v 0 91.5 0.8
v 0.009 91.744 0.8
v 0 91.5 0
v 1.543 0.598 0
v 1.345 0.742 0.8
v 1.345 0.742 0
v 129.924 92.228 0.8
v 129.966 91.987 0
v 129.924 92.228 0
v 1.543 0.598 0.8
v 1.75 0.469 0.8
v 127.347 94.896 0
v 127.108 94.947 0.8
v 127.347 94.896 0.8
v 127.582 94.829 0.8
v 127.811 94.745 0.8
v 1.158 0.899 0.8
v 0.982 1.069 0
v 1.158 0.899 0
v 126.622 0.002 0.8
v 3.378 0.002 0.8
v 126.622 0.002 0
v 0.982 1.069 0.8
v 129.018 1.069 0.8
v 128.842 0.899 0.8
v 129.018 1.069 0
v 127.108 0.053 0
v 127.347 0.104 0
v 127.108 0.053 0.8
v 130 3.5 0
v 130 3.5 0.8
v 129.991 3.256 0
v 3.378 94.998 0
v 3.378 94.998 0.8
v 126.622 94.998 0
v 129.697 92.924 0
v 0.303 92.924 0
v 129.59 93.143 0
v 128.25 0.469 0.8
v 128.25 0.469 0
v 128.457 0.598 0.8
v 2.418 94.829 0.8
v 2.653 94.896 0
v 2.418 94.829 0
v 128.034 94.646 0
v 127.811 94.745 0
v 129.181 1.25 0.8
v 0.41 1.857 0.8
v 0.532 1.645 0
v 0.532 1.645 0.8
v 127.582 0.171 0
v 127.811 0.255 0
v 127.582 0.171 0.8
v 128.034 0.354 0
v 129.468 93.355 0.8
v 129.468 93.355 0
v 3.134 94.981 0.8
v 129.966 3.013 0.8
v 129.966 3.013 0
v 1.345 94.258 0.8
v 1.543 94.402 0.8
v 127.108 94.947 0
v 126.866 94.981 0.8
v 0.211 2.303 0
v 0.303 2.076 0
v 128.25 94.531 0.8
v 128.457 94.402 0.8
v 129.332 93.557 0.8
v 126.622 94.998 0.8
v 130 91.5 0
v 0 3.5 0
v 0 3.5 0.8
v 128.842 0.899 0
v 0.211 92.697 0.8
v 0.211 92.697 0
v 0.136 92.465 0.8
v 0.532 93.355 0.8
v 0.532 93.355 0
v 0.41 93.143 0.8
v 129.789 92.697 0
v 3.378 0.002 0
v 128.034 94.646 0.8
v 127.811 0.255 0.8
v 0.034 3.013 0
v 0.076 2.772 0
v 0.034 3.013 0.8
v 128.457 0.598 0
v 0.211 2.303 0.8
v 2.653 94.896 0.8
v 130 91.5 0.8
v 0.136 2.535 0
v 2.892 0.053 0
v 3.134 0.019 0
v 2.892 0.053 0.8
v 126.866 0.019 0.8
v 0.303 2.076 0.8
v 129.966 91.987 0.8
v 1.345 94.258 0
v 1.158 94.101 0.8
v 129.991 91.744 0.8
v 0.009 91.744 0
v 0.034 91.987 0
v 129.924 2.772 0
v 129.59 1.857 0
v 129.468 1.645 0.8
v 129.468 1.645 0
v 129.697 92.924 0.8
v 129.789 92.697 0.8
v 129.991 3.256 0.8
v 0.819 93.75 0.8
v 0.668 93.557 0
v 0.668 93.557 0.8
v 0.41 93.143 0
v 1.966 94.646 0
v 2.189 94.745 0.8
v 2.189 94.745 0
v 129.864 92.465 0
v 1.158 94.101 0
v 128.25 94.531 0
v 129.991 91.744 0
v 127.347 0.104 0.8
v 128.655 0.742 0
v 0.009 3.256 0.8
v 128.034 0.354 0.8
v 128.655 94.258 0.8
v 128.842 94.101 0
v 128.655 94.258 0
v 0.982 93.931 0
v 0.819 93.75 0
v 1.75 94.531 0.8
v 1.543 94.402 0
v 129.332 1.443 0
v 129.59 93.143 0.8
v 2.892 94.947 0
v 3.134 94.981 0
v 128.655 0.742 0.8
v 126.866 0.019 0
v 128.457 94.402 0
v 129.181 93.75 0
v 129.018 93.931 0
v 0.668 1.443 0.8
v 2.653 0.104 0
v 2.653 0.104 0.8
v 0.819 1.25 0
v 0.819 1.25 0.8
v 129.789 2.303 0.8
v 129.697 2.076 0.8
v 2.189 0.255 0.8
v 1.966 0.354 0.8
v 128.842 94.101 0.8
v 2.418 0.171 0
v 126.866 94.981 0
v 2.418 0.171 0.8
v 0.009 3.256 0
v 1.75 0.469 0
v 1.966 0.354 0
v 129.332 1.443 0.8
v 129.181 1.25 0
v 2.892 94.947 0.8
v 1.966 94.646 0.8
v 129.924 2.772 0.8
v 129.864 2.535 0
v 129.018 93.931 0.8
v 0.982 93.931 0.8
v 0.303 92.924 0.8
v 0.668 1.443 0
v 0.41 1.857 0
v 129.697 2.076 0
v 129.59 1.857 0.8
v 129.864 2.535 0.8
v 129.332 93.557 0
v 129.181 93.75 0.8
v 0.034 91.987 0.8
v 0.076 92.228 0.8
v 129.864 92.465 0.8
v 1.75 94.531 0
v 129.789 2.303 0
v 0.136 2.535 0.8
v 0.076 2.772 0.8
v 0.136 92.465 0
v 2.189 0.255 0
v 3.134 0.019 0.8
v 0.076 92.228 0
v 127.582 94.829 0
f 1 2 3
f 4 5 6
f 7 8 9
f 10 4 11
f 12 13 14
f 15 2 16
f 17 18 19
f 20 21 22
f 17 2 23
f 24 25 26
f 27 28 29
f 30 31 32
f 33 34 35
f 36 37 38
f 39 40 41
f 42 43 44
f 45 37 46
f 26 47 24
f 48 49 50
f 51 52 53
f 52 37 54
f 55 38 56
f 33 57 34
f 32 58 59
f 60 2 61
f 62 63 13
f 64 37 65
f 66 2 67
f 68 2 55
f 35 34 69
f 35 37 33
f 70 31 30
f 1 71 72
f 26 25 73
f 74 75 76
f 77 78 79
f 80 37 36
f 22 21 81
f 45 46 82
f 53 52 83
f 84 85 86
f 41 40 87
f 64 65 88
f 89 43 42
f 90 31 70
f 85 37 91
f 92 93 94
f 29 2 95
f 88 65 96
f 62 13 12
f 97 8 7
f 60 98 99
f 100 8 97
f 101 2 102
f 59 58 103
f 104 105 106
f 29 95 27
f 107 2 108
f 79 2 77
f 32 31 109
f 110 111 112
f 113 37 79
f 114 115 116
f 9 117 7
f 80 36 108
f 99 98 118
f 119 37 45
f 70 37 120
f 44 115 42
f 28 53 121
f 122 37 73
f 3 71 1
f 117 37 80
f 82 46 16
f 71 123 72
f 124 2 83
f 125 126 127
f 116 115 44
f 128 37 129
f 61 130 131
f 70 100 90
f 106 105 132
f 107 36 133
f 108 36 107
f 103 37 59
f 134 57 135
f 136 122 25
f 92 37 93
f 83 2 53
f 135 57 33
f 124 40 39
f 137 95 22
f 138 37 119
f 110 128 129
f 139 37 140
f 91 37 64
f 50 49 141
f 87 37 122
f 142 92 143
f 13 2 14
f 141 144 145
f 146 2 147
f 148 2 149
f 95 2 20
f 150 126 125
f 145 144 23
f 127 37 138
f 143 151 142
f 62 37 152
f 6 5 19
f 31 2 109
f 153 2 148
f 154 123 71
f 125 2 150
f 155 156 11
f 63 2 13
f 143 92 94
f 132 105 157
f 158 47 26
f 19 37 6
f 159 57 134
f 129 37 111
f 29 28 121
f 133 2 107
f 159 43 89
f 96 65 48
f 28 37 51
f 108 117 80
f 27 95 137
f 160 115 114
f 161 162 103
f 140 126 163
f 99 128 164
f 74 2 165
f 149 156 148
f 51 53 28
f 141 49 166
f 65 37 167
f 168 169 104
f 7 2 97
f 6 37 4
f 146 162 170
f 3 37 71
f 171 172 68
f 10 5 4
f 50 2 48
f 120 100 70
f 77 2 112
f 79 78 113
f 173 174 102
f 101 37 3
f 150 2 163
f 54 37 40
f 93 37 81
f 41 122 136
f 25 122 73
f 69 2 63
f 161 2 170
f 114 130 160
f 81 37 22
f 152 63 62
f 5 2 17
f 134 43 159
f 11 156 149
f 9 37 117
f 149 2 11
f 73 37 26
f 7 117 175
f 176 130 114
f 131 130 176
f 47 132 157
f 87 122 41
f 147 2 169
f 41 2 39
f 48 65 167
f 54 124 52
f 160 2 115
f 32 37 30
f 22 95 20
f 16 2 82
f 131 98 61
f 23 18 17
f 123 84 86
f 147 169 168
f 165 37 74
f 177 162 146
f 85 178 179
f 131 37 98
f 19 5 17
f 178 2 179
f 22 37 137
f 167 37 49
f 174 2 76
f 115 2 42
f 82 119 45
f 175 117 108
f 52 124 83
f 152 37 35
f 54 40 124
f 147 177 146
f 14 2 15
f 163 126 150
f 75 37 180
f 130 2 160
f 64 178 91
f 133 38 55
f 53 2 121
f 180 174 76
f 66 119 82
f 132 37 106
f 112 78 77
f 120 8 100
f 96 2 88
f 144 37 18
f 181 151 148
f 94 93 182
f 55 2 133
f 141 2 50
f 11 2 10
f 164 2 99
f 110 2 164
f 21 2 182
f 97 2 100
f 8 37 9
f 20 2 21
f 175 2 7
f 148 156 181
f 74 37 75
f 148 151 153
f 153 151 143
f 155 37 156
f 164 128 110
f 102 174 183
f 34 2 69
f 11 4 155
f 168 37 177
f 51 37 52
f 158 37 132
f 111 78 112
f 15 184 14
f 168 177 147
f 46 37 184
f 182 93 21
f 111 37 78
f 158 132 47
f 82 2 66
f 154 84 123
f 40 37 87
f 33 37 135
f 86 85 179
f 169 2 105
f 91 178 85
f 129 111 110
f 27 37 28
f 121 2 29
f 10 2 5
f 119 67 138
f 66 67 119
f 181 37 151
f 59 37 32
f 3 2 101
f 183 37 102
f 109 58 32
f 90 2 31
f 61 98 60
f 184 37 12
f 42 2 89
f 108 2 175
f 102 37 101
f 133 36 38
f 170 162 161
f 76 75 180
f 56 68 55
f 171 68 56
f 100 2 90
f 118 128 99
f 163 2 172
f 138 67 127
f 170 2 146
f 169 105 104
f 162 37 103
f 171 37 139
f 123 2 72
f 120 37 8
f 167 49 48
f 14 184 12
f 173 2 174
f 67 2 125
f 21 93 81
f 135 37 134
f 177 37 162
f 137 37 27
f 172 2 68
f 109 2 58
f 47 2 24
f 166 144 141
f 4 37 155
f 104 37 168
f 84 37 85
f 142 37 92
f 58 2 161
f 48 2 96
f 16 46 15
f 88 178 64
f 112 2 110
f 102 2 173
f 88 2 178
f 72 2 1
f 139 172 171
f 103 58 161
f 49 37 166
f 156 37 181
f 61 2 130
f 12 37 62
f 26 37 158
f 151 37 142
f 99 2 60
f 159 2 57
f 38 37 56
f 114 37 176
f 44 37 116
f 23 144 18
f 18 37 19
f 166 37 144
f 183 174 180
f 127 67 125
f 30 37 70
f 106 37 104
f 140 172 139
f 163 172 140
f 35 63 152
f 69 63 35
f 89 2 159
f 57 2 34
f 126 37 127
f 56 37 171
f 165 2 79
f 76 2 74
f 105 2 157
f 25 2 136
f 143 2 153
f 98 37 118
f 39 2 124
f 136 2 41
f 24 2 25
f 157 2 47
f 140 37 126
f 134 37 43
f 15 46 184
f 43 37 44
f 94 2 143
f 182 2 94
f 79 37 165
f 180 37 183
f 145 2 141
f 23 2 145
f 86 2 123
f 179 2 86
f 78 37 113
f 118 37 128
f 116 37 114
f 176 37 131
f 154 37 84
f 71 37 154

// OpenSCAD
// file: ../../Base/PlacementOptions.scad
// Fischertechnik Box Foundation
// Placement Options

// Alignment
NoAlign = 0;
AlignLeft = 1;
AlignBottom = 2;
AlignCenter = 3;
AlignRight = 4;
AlignTop = 5;

// Element rotation degree steps
rotations = [0, -90, -180, -270];

// Rotation
NoRotation = 0;
Rotate0 = 0;
Rotate90 = 1;
Rotate180 = 2;
Rotate270 = 3;

// Docking (seen from above)
NoDock = -1;
DockLeft = 0;
DockTop = 1;
DockRight = 2;
DockCorner = 2;
DockBottom = 3;

// Web corners
LowerLeft = 0;
UpperLeft = 1;
UpperRight = 2;
LowerRight = 3;

// Web position relative to corner
LeftOfCorner = 0;
RightOfCorner = 1;
// file: ../../Base/Constants.scad
// Fischertechnik Box Foundation
// Constants

// Constant values necessary for multiple elements

// Base constants
dividerThickness = 1.2;
excess = 0.01;
fragments = 90;
tolerance = 0.8;

// Gets the thickness of a divider 
function getDividerThickness() = dividerThickness;

// Gets the excess that is used to merge walls into each other
function getExcess() = excess;

// Gets amount of fragments of a cylinder
function getFragments() = fragments;

// Gets the inner tolerance of a frame to each side
function getTolerance() = tolerance;


// Fischertechnik specific constants
axisDiameter = 4;
axisBottomDiameter = axisDiameter + 1;
axisTolerance = 0.2;

// Gets axis diameter of Fischertechnik axis
function getAxisDiameter() = axisDiameter;

// Gets axis diameter tolerance (subtracted for element axis)
function getAxisTolerance() = axisTolerance;

// Gets the axis diameter for standing axis
function getStandAxisDiameter() = getAxisDiameter() - getAxisTolerance();

// Gets axis bottom diameter for thicker part at the bottom
function getAxisBottomDiameter() = axisBottomDiameter;

standardEdgeDistance = 2.5;
standardWebDistance = 11.5;
standardCornerLength = 15;

// gets the standard distance to the wall of the box for dockable frames with webs
function getStandardEdgeDistance() = standardEdgeDistance;

// gets the standard distance of each web to the corner of the dockable frame
function getStandardWebDistance() = standardWebDistance;

// gets the standard length of the corner walls of a dockable frame
function getStandardCornerLength() = standardCornerLength;

tubeWallFactor = 0.8;

// gets the wall thickness of a tube.
function getTubeWallThickness() = tubeWallFactor * getDividerThickness();

smallPartsFrameHeight = 20;

// gets the frame height for docked small parts boxes.
function getSmallPartsFrameHeight() = smallPartsFrameHeight;

hubRingDiameter = 19.5;
hubRingLevelDiameter = 21;

// gets the diameter of a tube matching the inner ring of a wheel
function getHubRingDiameter() = hubRingDiameter;

// gets the diameter of a hub tube with a thicker diameter
function getHubRingLevelDiameter() = hubRingLevelDiameter;
// file: ../../Base/Boxes.scad
// Fischertechnik Box Foundation
// Pre-designed Boxes

use <Constants.scad>

include <PlacementOptions.scad>

box190Width = 190;
box190Depth = 130;
box130Width = 130;
box130Depth = 95;

// Values are from an original ec3 box
topBottomDifference = 1.5;
outerHeight = 40;
innerHeight = 38.2;
baseThickness = outerHeight - innerHeight;
stackExcess = 5.7;
radius = 3.5;
wallThickness = 1.5;
tolerance = 0.2;
stackOffset = innerHeight - stackExcess;

boxUsageHeight = stackOffset;
boxWallThickness = wallThickness;
boxBaseThickness = baseThickness;
boxWebWidth = 3.0;

// getBoxWallThickness()
// Gets the wall thickness of a Fischertechnik Box
function getBoxWallThickness() = boxWallThickness;

// getBoxUsageHeight()
// Gets the usable height of a Fischertechnik box
function getBoxUsageHeight() = boxUsageHeight;

// getBoxInnerHeight()
// Gets the inner height of a Fischertechnik box, including the stack excess
function getBoxInnerHeight() = innerHeight;

// getBoxBaseThickness()
// Gets the thickness of the Fischertechnik box base.
function getBoxBaseThickness() = boxBaseThickness;

// getBoxWebWidth()
// Gets the width of a box web
function getBoxWebWidth() = boxWebWidth;

// getBox190Space()
// Gets the usable inner space of a Box 190 as an x/y-list
function getBox190Space() = [
    box190Width - 2*getBoxWallThickness() - topBottomDifference, 
    box190Depth - 2*getBoxWallThickness() - topBottomDifference ];

// RoundedCornerPlate(width, depth, height, radius)
// Creates a body plate with rounded corners for a box. Used
// also to create the complete box with the hull module.
// width = Width of the plate
// depth = depth of the plate 
// height = thickness of the plate
// radius = radius of the rounded corner
module RoundedCornerPlate(width, depth, height, radius) {
    translate([radius, radius])
    hull() {
        w = width-2*radius;
        d = depth-2*radius;
        cube([w, d, height]);
        cylinder(height, r=radius, $fn=getFragments());
        translate([w, 0])
            cylinder(height, r=radius, $fn=getFragments());
        translate([w, d])
            cylinder(height, r=radius, $fn=getFragments());
        translate([0, d])
            cylinder(height, r=radius, $fn=getFragments());
    }
}

// BoxBase(width, depth)
// Creates an empty stackable Fischertechnik compatible box
// width = Outer width of the box (190, 130, ...)
// depth = Outer depth of the box (130, 95, ...)

module BoxBase(width, depth, height=outerHeight) {    
    thinPlate = 0.01;

    innerHeight = height - baseThickness;    
    
    module Body(tolerance=tolerance) {
        hull() {
            // Bottom with tolerance to fit into the original boxes when stacked
            translate([-wallThickness+tolerance, -wallThickness+tolerance, -baseThickness])
                RoundedCornerPlate(width-topBottomDifference-2*tolerance, depth-topBottomDifference-2*tolerance, thinPlate, radius);
            
            // Top
            translate([-wallThickness-topBottomDifference/2, -wallThickness-topBottomDifference/2, innerHeight-thinPlate])
                RoundedCornerPlate(width, depth, thinPlate, radius);
         }
    }

    module Cutoff() {
        hull() {
            coWidth = width - 2*wallThickness;
            coDepth = depth - 2*wallThickness;
            
            // Bottom
            RoundedCornerPlate(coWidth-topBottomDifference, coDepth-topBottomDifference, thinPlate, radius);

            // Top
            translate([-topBottomDifference/2, -topBottomDifference/2, innerHeight+thinPlate]) 
                RoundedCornerPlate(coWidth, coDepth, thinPlate, radius);
        }
    }
    
    difference() {        
        Body();
        Cutoff();
        stackOffset = innerHeight - stackExcess;
        translate([0, 0, stackOffset + baseThickness])
            Body(tolerance=0);
    }
}

// Creates the Fischertechnik empty box 130x190 mm and places it at position 0,0
// 190x130 are the outer sizes, the inner space is slightly smaller. Use getBox190Space() to get the inner sizes.
// The box is positioned that the usable inner space is at the 0,0,0 position.

module Box190() {
    BoxBase(box190Width, box190Depth);
}

// Gets the usable inner space of a Box 130 as an x/y-list
function getBox130Space() = [
    box130Width - 2*getBoxWallThickness() - topBottomDifference, 
    box130Depth - 2*getBoxWallThickness() - topBottomDifference ];

// Creates the Fischertechnik empty box 95x130 mm and places it at position 0,0
// 190x130 are the outer sizes, the inner space is slightly smaller. Use getBox190Space() to get the inner sizes.
// The box is positioned that the usable inner space is at the 0,0,0 position.

module Box130() {
    BoxBase(box130Width, box130Depth);
}

// Creates a web at the specified box walls
// corner 0 = LowerLeft, 1 = UpperLeft, 2 = UpperRight, 3 = LowerRight
// side 0 = LeftOfCorner, 1 = RightOfCorner
// distance = Distance in mm from the corner
// boxSpace = inner width and depth of the box (default: Box 190)
// webWidth = length of the web (default is 3 mms)
// webThickness = thickness of the web (default is 1 mm)

module BoxWeb(corner, side, distance, boxSpace=getBox190Space(), webWidth=getBoxWebWidth(), webThickness=1.0) {
    sink = getBoxWallThickness()/2;

    width = (corner % 2 == 0) ? 
            (side == LeftOfCorner ? webWidth : webThickness) :
            (side == LeftOfCorner ? webThickness : webWidth);

    depth = (corner % 2 == 0) ? 
            (side == RightOfCorner ? webWidth : webThickness) :
            (side == RightOfCorner ? webThickness : webWidth);
    
    xDiff = corner == LowerLeft ? 
                (side == LeftOfCorner ? -sink : distance) :
            (corner == UpperLeft ?                
                (side == LeftOfCorner ? distance : -sink) :
            (corner == UpperRight ?
                (side == LeftOfCorner ? boxSpace.x-webWidth+sink : boxSpace.x-distance-webThickness) :
                (side == LeftOfCorner ? boxSpace.x-distance-webThickness: boxSpace.x-webWidth+sink)));

    yDiff = corner == LowerLeft ? 
                (side == RightOfCorner ? -sink : distance) :
            (corner == UpperLeft ?
                (side == RightOfCorner ? boxSpace.y-distance : boxSpace.y-webWidth+sink) :
            (corner == UpperRight ?
                (side == RightOfCorner ? boxSpace.y-webWidth+sink : boxSpace.y-distance) :
                (side == RightOfCorner ? distance : -sink)));
    
    translate([xDiff, yDiff, -getExcess()])
        cube([width, depth, boxUsageHeight + 2*getExcess()]);
}
// main file
// Fischertechnik Box Foundation
// Boxes Test
// Test RoundedCornerPlate

use <../../Base/Boxes.scad>

RoundedCornerPlate(130, 95,0.8, 3.5);
